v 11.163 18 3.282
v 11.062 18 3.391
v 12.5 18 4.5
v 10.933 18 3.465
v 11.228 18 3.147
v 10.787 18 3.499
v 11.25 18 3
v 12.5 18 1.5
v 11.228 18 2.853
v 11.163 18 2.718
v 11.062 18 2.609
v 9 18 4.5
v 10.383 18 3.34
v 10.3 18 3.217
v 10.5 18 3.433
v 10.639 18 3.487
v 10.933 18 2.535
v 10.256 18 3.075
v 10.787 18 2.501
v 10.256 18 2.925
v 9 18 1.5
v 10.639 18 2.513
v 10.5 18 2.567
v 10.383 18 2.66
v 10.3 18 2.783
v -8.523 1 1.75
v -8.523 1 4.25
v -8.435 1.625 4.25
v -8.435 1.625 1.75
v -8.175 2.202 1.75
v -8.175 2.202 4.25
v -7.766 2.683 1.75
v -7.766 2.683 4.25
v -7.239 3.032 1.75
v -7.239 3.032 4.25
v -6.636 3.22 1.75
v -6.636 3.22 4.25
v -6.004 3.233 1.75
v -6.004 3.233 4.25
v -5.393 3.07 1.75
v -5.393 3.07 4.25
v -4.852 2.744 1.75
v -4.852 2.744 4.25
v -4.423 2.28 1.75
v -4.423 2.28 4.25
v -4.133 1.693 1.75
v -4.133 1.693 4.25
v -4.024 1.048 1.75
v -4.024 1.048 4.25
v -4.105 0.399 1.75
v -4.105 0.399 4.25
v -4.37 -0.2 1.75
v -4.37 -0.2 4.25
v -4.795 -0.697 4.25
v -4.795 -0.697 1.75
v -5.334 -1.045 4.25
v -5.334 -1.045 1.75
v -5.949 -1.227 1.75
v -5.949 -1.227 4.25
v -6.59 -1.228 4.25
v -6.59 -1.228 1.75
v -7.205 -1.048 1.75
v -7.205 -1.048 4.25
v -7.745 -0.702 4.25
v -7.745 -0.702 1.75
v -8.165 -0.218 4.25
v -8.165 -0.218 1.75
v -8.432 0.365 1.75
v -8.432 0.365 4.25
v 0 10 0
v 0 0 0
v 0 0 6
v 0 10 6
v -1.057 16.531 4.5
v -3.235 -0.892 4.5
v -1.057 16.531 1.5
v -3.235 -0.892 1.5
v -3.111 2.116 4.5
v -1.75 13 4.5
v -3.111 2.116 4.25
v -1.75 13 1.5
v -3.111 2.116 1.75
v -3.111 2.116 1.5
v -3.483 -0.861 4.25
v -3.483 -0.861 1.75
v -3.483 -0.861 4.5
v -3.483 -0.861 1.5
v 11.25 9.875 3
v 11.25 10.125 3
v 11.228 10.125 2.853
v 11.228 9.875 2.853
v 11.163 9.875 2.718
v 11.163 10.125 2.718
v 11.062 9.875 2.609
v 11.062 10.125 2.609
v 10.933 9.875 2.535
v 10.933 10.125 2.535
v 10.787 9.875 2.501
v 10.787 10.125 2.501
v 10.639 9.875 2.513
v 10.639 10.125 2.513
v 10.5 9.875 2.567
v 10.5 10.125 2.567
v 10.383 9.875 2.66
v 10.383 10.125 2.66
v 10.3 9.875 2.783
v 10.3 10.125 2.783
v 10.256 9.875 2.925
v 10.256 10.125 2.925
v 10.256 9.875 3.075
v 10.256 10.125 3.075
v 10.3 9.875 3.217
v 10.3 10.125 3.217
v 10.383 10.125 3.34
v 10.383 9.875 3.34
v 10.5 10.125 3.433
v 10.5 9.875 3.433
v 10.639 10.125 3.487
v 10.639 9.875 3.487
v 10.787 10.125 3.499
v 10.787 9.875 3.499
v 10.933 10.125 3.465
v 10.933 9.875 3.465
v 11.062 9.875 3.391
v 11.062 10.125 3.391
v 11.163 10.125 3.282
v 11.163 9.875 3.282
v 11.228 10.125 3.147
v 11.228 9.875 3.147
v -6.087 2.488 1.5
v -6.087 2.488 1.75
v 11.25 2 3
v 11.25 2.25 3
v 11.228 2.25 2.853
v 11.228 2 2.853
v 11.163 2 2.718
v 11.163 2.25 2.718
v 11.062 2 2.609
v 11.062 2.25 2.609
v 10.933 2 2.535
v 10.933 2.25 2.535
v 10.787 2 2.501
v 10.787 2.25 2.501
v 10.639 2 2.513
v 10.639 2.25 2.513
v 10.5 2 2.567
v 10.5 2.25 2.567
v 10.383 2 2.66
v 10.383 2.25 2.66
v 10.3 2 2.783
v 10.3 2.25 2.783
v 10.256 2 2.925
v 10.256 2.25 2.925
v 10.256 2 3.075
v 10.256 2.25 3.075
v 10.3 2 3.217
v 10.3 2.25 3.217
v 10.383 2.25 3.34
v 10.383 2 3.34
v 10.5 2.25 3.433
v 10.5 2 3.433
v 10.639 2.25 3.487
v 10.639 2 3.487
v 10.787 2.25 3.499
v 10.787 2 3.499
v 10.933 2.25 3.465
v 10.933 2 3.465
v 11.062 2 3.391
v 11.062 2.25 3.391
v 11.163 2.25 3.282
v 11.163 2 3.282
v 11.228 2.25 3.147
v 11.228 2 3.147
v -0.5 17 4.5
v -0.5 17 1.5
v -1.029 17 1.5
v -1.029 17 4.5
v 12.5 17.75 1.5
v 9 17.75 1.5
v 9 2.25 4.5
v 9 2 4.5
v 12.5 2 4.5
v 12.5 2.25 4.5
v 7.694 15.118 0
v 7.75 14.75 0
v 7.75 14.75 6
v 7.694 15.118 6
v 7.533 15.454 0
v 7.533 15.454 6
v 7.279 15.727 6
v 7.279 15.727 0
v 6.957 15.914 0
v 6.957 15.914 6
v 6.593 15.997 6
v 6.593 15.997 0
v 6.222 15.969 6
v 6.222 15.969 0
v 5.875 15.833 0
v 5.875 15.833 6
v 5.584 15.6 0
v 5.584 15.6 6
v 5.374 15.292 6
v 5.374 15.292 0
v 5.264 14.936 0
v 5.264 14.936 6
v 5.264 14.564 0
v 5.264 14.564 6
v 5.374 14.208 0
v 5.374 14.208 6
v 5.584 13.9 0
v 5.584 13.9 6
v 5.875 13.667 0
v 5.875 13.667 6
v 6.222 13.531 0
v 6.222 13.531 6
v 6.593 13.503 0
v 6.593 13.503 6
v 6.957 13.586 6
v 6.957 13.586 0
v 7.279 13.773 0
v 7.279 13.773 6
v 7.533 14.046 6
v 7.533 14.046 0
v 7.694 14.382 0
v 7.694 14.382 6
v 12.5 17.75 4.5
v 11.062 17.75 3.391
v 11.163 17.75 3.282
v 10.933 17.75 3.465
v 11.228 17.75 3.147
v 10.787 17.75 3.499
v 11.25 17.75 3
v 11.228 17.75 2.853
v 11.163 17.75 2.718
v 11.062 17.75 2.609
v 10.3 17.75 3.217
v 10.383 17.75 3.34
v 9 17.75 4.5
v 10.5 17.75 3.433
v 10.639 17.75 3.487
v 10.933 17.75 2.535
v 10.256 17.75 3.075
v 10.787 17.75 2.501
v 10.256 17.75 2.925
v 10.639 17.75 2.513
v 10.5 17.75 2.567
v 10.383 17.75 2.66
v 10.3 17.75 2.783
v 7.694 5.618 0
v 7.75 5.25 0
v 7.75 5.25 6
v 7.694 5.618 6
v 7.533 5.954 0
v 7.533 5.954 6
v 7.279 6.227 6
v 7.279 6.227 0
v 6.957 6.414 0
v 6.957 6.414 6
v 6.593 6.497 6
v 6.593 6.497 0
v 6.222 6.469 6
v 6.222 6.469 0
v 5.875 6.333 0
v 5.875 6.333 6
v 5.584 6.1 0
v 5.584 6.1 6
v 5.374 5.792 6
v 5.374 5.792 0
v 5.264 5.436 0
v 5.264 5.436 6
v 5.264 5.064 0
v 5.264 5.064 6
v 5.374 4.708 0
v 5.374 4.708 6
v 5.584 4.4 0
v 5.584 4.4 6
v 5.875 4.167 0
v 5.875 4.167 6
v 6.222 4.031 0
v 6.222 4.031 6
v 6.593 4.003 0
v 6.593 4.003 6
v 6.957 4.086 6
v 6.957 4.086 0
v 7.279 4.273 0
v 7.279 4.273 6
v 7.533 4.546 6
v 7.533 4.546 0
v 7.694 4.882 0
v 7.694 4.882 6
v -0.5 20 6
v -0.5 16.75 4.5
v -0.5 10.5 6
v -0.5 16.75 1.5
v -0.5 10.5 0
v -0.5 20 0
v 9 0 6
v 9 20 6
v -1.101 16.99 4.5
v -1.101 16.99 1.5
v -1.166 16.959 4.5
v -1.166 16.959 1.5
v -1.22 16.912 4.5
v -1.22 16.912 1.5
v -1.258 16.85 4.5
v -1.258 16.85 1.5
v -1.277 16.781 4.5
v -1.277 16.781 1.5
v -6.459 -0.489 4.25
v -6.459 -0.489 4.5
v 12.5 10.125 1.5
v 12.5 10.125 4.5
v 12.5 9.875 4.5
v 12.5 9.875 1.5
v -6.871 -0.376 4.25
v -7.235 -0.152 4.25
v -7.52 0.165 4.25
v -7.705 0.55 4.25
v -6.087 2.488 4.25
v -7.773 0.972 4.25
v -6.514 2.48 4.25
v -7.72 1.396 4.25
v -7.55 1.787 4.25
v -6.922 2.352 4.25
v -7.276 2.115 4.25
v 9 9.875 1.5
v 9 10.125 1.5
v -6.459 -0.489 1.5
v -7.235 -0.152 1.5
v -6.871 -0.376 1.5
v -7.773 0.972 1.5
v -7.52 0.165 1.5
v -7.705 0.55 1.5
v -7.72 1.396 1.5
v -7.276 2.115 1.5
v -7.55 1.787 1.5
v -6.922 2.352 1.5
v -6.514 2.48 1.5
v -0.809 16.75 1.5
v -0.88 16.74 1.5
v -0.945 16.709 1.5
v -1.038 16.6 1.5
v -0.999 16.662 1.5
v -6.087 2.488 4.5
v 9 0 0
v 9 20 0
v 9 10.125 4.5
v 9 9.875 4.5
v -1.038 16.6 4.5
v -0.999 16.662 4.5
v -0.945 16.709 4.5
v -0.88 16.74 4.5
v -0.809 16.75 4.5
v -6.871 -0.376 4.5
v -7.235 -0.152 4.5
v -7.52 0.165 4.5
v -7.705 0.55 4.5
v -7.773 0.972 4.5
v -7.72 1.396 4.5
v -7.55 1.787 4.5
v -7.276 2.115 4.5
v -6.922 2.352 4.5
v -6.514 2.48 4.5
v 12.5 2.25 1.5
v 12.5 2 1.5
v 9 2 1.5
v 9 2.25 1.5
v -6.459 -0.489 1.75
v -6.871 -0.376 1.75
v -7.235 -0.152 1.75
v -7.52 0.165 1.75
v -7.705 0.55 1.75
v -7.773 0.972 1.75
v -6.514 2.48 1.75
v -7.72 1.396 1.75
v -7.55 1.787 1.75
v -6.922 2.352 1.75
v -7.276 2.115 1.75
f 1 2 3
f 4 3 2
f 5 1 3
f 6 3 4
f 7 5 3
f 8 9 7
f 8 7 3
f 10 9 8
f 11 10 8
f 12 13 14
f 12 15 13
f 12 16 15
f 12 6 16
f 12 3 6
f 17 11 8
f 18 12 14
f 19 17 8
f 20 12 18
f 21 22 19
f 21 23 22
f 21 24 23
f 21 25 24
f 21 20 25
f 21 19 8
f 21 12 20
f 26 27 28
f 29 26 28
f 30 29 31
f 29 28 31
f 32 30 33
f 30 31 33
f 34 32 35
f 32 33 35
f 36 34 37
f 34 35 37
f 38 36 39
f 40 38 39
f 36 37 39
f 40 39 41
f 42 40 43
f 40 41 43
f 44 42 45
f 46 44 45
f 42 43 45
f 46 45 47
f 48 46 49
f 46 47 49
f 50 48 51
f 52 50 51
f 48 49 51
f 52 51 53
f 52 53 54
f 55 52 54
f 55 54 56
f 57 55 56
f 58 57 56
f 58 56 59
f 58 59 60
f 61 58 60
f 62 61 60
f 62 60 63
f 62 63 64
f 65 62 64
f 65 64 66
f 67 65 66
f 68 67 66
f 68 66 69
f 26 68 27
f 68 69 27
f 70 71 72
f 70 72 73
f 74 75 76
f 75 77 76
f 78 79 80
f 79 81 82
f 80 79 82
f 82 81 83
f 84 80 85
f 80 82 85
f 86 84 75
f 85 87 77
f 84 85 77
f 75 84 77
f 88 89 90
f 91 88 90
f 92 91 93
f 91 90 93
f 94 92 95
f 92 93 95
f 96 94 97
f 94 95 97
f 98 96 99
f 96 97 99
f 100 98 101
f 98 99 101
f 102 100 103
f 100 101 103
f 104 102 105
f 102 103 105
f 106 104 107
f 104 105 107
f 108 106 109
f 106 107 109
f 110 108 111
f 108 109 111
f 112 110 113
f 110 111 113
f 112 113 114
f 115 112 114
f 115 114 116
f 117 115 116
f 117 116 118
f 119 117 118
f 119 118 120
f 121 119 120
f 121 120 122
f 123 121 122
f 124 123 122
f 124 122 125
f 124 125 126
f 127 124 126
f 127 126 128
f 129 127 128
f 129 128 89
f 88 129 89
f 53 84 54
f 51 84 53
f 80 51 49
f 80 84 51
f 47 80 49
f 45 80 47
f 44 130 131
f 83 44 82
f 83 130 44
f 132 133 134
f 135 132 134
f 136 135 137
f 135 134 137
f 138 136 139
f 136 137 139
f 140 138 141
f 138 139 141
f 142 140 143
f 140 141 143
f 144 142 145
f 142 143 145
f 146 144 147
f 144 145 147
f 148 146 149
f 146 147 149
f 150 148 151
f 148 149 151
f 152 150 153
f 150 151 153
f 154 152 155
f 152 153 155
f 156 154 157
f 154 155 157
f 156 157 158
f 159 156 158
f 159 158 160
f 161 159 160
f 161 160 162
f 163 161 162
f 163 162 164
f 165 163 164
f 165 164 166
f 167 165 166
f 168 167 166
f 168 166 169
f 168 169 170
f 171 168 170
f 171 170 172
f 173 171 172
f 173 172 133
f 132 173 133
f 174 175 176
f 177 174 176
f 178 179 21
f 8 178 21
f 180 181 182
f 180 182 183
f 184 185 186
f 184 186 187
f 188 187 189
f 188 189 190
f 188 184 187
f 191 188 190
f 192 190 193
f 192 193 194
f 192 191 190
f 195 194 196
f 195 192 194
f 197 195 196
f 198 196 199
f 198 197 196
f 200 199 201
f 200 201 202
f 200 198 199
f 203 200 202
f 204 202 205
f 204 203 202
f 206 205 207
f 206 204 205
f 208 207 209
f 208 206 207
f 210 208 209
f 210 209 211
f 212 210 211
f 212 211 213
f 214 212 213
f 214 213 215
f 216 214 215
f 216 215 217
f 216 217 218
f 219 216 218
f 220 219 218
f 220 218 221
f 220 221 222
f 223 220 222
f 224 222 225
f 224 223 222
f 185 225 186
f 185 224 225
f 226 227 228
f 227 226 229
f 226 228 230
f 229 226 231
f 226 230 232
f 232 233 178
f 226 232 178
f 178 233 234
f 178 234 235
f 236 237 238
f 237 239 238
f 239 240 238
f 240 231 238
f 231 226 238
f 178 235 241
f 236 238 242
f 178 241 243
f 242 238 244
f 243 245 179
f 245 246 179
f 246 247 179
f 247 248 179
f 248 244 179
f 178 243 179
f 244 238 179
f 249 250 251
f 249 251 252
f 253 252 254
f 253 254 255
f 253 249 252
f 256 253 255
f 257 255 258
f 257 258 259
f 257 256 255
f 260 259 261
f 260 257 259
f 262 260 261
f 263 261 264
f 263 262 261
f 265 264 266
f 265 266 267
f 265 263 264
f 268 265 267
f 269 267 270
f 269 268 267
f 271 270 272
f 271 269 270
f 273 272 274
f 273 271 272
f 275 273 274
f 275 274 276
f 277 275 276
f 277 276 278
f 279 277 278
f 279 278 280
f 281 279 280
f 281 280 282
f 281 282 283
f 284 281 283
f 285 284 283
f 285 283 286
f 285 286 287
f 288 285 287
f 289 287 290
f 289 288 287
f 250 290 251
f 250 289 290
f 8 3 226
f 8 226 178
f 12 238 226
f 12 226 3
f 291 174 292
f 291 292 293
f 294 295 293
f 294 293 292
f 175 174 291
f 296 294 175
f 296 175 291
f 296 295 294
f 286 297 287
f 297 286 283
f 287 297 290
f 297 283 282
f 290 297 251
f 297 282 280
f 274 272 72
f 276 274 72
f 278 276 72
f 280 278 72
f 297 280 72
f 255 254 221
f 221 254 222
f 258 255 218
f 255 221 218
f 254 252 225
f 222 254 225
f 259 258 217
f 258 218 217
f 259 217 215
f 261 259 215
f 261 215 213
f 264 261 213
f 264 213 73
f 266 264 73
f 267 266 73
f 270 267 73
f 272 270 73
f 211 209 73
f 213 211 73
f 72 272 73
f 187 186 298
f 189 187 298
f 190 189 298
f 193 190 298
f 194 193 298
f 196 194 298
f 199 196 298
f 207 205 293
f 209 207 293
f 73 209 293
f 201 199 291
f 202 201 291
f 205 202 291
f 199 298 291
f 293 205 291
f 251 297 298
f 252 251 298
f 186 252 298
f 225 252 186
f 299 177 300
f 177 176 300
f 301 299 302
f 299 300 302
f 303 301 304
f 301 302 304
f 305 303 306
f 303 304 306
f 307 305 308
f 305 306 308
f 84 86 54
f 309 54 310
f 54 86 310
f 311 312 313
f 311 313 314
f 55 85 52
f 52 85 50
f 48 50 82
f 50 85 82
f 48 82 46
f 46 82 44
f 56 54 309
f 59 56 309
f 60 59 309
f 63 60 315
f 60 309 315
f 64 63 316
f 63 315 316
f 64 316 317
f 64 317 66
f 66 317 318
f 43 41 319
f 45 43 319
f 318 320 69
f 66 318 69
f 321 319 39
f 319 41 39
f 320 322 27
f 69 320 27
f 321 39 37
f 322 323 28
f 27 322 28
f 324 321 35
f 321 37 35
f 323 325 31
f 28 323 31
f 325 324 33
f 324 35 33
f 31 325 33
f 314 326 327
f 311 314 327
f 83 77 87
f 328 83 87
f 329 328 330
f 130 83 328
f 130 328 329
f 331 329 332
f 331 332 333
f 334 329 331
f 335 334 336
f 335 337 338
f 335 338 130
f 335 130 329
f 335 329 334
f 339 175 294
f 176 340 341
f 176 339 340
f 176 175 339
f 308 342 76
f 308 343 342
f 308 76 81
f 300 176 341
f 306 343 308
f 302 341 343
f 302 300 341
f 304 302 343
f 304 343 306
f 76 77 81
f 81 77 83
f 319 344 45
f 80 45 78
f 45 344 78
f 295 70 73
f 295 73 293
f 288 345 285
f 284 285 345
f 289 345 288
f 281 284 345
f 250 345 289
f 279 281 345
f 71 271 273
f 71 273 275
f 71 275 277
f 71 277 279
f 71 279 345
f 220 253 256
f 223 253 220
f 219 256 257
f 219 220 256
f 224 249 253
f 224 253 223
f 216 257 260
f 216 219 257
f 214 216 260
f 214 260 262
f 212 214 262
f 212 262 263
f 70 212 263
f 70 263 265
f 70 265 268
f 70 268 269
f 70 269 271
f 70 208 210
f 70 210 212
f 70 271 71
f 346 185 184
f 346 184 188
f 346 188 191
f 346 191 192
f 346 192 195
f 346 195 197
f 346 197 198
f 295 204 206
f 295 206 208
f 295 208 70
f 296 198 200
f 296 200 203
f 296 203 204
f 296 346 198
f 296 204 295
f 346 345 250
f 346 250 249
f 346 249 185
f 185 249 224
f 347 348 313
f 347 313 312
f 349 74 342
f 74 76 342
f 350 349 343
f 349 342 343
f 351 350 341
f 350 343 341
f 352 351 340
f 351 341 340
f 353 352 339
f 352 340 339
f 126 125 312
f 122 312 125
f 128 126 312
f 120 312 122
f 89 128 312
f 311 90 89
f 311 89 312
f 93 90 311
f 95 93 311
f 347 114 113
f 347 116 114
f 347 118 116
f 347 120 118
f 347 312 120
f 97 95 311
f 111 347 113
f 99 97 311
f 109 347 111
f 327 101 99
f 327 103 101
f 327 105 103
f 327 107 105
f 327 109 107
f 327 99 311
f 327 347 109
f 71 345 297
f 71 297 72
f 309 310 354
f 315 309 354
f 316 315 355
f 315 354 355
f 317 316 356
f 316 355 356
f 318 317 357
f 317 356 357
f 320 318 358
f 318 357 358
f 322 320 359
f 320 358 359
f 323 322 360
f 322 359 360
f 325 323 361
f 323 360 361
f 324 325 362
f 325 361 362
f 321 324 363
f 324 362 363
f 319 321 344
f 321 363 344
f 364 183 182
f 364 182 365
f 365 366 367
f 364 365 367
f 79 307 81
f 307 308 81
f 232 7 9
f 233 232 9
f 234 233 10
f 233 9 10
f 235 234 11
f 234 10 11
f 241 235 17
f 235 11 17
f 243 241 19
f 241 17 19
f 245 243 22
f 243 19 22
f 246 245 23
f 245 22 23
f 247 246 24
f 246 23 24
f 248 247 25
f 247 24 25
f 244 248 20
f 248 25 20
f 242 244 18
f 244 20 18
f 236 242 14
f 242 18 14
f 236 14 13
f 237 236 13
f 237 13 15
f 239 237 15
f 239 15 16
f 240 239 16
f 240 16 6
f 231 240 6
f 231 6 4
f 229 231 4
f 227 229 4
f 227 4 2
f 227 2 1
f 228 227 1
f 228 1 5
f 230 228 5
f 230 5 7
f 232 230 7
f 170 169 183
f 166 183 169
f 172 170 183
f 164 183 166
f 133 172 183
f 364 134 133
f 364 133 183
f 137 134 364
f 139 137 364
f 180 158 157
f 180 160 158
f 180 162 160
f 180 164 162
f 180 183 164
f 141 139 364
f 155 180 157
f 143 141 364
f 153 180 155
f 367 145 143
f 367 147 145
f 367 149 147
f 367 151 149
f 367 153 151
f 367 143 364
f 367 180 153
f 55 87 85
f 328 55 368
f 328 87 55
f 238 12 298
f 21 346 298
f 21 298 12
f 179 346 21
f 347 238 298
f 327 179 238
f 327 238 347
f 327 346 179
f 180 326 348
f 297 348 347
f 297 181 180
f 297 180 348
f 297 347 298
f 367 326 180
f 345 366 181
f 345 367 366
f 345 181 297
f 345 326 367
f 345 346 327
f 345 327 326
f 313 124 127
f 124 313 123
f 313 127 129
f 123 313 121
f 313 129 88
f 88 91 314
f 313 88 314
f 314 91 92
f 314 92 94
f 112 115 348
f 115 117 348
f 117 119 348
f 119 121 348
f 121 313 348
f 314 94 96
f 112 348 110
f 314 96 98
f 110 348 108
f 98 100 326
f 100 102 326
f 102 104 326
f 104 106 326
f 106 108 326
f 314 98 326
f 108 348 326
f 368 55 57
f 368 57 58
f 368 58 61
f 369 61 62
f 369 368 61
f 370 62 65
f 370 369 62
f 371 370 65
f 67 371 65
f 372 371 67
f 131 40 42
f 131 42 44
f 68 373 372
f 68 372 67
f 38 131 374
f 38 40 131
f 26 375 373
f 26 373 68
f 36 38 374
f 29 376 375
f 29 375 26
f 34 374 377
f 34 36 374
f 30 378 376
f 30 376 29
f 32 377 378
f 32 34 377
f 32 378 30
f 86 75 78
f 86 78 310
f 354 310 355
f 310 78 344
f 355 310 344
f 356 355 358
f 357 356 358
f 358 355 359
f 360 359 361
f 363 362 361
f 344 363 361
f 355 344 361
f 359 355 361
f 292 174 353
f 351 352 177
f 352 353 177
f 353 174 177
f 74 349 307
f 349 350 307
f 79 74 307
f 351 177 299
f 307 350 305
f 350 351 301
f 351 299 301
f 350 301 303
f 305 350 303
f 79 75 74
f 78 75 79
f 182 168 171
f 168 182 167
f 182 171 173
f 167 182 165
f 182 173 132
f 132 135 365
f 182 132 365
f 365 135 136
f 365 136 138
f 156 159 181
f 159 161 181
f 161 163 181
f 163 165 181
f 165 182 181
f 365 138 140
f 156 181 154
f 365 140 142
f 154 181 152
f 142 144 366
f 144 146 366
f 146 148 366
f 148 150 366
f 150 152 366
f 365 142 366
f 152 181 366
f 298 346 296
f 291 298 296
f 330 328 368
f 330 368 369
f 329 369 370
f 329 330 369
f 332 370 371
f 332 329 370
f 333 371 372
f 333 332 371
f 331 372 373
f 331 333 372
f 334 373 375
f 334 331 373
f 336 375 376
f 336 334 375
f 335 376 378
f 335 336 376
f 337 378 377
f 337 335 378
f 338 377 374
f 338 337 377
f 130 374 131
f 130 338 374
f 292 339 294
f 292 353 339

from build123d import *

# Parameters (mm, degrees)
SKETCH_1_R           = 1.25
EXTRUDE_1_DEPTH      = 6
EXTRUDE_2_DEPTH      = 1.5
EXTRUDE_2_DEPTH_BACK = 1.5
EXTRUDE_3_DEPTH      = 0.25
SKETCH_5_R           = 2.25
EXTRUDE_4_DEPTH      = 2.5
SKETCH_6_W           = 3
SKETCH_6_H           = 0.25
EXTRUDE_5_DEPTH      = 3.5
SKETCH_7_R           = 0.5
CUT_EXTRUDE_1_DEPTH  = 20.250480762


with BuildPart() as part:
    # Эскиз1 → Бобышка-Вытянуть1 (new body)
    with BuildSketch(Plane.XY):
        Polygon((0, 0), (0, 10), (-0.5, 10.5), (-0.5, 20), (0, 20), (9, 20), (9, 0), align=None)
        with Locations((6.5, 5.25)):
            Circle(SKETCH_1_R, mode=Mode.SUBTRACT)
        with Locations((6.5, 14.75)):
            Circle(SKETCH_1_R, mode=Mode.SUBTRACT)
    extrude(amount=EXTRUDE_1_DEPTH)

    # Эскиз3 → Бобышка-Вытянуть2 (add, two sides)
    with BuildSketch(Plane(origin=(0, 0, 3), x_dir=(0, -1, 0), z_dir=(0, 0, -1))) as extrude_2_sk:
        with BuildLine():
            Line((-17, 0.5), (-17, 1.029304445))
            ThreePointArc((-17, 1.029304445), (-16.937419544, 1.194755086), (-16.781008684, 1.277373915))
            Line((-16.781008684, 1.277373915), (-13, 1.75))
            Line((-13, 1.75), (0.861001781, 3.482625223))
            Line((0.861001781, 3.482625223), (0.892010464, 3.234555753))
            Line((0.892010464, 3.234555753), (-16.531008684, 1.05667836))
            ThreePointArc((-16.531008684, 1.05667836), (-16.687419544, 0.974059532), (-16.75, 0.808608891))
            Line((-16.75, 0.808608891), (-16.75, 0.5))
            Line((-16.75, 0.5), (-17, 0.5))
        make_face()
    extrude(amount=EXTRUDE_2_DEPTH)
    extrude(extrude_2_sk.sketch, amount=-EXTRUDE_2_DEPTH_BACK)

    # Эскиз4 → Бобышка-Вытянуть3 (add)
    with BuildSketch(Plane.XY.offset(4.5)):
        with BuildLine():
            Line((-3.482625223, -0.861001781), (-6.459458853, -0.488897577))
            ThreePointArc((-6.459458853, -0.488897577), (-7.761823566, 1.18557134), (-6.087354649, 2.487936053))
            Line((-6.087354649, 2.487936053), (-3.110521019, 2.115831849))
            Line((-3.110521019, 2.115831849), (-3.482625223, -0.861001781))
        make_face()
    extrude_3 = extrude(amount=-EXTRUDE_3_DEPTH)

    # Зеркальное отражение1: Бобышка-Вытянуть3 across plane
    add(extrude_3.mirror(Plane(origin=(0, 0, 3), x_dir=(1, 0, 0), z_dir=(0, 0, -1))))

    # Эскиз5 → Бобышка-Вытянуть4 (add)
    with BuildSketch(Plane(origin=(0, 0, 4.25), x_dir=(-1, 0, 0), z_dir=(0, 0, -1))):
        with Locations((6.273406751, 0.999519238)):
            Circle(SKETCH_5_R)
    extrude(amount=EXTRUDE_4_DEPTH)

    # Эскиз6 → Бобышка-Вытянуть5 (add)
    with BuildSketch(Plane(origin=(9, 0, 0), x_dir=(0, 0, -1), z_dir=(1, 0, 0))):
        with Locations((-3, 2.125)):
            Rectangle(SKETCH_6_W, SKETCH_6_H)
        with Locations((-3, 17.875)):
            Rectangle(SKETCH_6_W, SKETCH_6_H)
        with Locations((-3, 10)):
            Rectangle(SKETCH_6_W, SKETCH_6_H)
    extrude(amount=EXTRUDE_5_DEPTH)

    # Эскиз7 → Вырез-Вытянуть1 (cut, through all)
    with BuildSketch(Plane(origin=(0, 18, 0), x_dir=(1, 0, 0), z_dir=(0, 1, 0))):
        with Locations((10.75, -3)):
            Circle(SKETCH_7_R)
    extrude(amount=-CUT_EXTRUDE_1_DEPTH, mode=Mode.SUBTRACT)


solid = part.part
